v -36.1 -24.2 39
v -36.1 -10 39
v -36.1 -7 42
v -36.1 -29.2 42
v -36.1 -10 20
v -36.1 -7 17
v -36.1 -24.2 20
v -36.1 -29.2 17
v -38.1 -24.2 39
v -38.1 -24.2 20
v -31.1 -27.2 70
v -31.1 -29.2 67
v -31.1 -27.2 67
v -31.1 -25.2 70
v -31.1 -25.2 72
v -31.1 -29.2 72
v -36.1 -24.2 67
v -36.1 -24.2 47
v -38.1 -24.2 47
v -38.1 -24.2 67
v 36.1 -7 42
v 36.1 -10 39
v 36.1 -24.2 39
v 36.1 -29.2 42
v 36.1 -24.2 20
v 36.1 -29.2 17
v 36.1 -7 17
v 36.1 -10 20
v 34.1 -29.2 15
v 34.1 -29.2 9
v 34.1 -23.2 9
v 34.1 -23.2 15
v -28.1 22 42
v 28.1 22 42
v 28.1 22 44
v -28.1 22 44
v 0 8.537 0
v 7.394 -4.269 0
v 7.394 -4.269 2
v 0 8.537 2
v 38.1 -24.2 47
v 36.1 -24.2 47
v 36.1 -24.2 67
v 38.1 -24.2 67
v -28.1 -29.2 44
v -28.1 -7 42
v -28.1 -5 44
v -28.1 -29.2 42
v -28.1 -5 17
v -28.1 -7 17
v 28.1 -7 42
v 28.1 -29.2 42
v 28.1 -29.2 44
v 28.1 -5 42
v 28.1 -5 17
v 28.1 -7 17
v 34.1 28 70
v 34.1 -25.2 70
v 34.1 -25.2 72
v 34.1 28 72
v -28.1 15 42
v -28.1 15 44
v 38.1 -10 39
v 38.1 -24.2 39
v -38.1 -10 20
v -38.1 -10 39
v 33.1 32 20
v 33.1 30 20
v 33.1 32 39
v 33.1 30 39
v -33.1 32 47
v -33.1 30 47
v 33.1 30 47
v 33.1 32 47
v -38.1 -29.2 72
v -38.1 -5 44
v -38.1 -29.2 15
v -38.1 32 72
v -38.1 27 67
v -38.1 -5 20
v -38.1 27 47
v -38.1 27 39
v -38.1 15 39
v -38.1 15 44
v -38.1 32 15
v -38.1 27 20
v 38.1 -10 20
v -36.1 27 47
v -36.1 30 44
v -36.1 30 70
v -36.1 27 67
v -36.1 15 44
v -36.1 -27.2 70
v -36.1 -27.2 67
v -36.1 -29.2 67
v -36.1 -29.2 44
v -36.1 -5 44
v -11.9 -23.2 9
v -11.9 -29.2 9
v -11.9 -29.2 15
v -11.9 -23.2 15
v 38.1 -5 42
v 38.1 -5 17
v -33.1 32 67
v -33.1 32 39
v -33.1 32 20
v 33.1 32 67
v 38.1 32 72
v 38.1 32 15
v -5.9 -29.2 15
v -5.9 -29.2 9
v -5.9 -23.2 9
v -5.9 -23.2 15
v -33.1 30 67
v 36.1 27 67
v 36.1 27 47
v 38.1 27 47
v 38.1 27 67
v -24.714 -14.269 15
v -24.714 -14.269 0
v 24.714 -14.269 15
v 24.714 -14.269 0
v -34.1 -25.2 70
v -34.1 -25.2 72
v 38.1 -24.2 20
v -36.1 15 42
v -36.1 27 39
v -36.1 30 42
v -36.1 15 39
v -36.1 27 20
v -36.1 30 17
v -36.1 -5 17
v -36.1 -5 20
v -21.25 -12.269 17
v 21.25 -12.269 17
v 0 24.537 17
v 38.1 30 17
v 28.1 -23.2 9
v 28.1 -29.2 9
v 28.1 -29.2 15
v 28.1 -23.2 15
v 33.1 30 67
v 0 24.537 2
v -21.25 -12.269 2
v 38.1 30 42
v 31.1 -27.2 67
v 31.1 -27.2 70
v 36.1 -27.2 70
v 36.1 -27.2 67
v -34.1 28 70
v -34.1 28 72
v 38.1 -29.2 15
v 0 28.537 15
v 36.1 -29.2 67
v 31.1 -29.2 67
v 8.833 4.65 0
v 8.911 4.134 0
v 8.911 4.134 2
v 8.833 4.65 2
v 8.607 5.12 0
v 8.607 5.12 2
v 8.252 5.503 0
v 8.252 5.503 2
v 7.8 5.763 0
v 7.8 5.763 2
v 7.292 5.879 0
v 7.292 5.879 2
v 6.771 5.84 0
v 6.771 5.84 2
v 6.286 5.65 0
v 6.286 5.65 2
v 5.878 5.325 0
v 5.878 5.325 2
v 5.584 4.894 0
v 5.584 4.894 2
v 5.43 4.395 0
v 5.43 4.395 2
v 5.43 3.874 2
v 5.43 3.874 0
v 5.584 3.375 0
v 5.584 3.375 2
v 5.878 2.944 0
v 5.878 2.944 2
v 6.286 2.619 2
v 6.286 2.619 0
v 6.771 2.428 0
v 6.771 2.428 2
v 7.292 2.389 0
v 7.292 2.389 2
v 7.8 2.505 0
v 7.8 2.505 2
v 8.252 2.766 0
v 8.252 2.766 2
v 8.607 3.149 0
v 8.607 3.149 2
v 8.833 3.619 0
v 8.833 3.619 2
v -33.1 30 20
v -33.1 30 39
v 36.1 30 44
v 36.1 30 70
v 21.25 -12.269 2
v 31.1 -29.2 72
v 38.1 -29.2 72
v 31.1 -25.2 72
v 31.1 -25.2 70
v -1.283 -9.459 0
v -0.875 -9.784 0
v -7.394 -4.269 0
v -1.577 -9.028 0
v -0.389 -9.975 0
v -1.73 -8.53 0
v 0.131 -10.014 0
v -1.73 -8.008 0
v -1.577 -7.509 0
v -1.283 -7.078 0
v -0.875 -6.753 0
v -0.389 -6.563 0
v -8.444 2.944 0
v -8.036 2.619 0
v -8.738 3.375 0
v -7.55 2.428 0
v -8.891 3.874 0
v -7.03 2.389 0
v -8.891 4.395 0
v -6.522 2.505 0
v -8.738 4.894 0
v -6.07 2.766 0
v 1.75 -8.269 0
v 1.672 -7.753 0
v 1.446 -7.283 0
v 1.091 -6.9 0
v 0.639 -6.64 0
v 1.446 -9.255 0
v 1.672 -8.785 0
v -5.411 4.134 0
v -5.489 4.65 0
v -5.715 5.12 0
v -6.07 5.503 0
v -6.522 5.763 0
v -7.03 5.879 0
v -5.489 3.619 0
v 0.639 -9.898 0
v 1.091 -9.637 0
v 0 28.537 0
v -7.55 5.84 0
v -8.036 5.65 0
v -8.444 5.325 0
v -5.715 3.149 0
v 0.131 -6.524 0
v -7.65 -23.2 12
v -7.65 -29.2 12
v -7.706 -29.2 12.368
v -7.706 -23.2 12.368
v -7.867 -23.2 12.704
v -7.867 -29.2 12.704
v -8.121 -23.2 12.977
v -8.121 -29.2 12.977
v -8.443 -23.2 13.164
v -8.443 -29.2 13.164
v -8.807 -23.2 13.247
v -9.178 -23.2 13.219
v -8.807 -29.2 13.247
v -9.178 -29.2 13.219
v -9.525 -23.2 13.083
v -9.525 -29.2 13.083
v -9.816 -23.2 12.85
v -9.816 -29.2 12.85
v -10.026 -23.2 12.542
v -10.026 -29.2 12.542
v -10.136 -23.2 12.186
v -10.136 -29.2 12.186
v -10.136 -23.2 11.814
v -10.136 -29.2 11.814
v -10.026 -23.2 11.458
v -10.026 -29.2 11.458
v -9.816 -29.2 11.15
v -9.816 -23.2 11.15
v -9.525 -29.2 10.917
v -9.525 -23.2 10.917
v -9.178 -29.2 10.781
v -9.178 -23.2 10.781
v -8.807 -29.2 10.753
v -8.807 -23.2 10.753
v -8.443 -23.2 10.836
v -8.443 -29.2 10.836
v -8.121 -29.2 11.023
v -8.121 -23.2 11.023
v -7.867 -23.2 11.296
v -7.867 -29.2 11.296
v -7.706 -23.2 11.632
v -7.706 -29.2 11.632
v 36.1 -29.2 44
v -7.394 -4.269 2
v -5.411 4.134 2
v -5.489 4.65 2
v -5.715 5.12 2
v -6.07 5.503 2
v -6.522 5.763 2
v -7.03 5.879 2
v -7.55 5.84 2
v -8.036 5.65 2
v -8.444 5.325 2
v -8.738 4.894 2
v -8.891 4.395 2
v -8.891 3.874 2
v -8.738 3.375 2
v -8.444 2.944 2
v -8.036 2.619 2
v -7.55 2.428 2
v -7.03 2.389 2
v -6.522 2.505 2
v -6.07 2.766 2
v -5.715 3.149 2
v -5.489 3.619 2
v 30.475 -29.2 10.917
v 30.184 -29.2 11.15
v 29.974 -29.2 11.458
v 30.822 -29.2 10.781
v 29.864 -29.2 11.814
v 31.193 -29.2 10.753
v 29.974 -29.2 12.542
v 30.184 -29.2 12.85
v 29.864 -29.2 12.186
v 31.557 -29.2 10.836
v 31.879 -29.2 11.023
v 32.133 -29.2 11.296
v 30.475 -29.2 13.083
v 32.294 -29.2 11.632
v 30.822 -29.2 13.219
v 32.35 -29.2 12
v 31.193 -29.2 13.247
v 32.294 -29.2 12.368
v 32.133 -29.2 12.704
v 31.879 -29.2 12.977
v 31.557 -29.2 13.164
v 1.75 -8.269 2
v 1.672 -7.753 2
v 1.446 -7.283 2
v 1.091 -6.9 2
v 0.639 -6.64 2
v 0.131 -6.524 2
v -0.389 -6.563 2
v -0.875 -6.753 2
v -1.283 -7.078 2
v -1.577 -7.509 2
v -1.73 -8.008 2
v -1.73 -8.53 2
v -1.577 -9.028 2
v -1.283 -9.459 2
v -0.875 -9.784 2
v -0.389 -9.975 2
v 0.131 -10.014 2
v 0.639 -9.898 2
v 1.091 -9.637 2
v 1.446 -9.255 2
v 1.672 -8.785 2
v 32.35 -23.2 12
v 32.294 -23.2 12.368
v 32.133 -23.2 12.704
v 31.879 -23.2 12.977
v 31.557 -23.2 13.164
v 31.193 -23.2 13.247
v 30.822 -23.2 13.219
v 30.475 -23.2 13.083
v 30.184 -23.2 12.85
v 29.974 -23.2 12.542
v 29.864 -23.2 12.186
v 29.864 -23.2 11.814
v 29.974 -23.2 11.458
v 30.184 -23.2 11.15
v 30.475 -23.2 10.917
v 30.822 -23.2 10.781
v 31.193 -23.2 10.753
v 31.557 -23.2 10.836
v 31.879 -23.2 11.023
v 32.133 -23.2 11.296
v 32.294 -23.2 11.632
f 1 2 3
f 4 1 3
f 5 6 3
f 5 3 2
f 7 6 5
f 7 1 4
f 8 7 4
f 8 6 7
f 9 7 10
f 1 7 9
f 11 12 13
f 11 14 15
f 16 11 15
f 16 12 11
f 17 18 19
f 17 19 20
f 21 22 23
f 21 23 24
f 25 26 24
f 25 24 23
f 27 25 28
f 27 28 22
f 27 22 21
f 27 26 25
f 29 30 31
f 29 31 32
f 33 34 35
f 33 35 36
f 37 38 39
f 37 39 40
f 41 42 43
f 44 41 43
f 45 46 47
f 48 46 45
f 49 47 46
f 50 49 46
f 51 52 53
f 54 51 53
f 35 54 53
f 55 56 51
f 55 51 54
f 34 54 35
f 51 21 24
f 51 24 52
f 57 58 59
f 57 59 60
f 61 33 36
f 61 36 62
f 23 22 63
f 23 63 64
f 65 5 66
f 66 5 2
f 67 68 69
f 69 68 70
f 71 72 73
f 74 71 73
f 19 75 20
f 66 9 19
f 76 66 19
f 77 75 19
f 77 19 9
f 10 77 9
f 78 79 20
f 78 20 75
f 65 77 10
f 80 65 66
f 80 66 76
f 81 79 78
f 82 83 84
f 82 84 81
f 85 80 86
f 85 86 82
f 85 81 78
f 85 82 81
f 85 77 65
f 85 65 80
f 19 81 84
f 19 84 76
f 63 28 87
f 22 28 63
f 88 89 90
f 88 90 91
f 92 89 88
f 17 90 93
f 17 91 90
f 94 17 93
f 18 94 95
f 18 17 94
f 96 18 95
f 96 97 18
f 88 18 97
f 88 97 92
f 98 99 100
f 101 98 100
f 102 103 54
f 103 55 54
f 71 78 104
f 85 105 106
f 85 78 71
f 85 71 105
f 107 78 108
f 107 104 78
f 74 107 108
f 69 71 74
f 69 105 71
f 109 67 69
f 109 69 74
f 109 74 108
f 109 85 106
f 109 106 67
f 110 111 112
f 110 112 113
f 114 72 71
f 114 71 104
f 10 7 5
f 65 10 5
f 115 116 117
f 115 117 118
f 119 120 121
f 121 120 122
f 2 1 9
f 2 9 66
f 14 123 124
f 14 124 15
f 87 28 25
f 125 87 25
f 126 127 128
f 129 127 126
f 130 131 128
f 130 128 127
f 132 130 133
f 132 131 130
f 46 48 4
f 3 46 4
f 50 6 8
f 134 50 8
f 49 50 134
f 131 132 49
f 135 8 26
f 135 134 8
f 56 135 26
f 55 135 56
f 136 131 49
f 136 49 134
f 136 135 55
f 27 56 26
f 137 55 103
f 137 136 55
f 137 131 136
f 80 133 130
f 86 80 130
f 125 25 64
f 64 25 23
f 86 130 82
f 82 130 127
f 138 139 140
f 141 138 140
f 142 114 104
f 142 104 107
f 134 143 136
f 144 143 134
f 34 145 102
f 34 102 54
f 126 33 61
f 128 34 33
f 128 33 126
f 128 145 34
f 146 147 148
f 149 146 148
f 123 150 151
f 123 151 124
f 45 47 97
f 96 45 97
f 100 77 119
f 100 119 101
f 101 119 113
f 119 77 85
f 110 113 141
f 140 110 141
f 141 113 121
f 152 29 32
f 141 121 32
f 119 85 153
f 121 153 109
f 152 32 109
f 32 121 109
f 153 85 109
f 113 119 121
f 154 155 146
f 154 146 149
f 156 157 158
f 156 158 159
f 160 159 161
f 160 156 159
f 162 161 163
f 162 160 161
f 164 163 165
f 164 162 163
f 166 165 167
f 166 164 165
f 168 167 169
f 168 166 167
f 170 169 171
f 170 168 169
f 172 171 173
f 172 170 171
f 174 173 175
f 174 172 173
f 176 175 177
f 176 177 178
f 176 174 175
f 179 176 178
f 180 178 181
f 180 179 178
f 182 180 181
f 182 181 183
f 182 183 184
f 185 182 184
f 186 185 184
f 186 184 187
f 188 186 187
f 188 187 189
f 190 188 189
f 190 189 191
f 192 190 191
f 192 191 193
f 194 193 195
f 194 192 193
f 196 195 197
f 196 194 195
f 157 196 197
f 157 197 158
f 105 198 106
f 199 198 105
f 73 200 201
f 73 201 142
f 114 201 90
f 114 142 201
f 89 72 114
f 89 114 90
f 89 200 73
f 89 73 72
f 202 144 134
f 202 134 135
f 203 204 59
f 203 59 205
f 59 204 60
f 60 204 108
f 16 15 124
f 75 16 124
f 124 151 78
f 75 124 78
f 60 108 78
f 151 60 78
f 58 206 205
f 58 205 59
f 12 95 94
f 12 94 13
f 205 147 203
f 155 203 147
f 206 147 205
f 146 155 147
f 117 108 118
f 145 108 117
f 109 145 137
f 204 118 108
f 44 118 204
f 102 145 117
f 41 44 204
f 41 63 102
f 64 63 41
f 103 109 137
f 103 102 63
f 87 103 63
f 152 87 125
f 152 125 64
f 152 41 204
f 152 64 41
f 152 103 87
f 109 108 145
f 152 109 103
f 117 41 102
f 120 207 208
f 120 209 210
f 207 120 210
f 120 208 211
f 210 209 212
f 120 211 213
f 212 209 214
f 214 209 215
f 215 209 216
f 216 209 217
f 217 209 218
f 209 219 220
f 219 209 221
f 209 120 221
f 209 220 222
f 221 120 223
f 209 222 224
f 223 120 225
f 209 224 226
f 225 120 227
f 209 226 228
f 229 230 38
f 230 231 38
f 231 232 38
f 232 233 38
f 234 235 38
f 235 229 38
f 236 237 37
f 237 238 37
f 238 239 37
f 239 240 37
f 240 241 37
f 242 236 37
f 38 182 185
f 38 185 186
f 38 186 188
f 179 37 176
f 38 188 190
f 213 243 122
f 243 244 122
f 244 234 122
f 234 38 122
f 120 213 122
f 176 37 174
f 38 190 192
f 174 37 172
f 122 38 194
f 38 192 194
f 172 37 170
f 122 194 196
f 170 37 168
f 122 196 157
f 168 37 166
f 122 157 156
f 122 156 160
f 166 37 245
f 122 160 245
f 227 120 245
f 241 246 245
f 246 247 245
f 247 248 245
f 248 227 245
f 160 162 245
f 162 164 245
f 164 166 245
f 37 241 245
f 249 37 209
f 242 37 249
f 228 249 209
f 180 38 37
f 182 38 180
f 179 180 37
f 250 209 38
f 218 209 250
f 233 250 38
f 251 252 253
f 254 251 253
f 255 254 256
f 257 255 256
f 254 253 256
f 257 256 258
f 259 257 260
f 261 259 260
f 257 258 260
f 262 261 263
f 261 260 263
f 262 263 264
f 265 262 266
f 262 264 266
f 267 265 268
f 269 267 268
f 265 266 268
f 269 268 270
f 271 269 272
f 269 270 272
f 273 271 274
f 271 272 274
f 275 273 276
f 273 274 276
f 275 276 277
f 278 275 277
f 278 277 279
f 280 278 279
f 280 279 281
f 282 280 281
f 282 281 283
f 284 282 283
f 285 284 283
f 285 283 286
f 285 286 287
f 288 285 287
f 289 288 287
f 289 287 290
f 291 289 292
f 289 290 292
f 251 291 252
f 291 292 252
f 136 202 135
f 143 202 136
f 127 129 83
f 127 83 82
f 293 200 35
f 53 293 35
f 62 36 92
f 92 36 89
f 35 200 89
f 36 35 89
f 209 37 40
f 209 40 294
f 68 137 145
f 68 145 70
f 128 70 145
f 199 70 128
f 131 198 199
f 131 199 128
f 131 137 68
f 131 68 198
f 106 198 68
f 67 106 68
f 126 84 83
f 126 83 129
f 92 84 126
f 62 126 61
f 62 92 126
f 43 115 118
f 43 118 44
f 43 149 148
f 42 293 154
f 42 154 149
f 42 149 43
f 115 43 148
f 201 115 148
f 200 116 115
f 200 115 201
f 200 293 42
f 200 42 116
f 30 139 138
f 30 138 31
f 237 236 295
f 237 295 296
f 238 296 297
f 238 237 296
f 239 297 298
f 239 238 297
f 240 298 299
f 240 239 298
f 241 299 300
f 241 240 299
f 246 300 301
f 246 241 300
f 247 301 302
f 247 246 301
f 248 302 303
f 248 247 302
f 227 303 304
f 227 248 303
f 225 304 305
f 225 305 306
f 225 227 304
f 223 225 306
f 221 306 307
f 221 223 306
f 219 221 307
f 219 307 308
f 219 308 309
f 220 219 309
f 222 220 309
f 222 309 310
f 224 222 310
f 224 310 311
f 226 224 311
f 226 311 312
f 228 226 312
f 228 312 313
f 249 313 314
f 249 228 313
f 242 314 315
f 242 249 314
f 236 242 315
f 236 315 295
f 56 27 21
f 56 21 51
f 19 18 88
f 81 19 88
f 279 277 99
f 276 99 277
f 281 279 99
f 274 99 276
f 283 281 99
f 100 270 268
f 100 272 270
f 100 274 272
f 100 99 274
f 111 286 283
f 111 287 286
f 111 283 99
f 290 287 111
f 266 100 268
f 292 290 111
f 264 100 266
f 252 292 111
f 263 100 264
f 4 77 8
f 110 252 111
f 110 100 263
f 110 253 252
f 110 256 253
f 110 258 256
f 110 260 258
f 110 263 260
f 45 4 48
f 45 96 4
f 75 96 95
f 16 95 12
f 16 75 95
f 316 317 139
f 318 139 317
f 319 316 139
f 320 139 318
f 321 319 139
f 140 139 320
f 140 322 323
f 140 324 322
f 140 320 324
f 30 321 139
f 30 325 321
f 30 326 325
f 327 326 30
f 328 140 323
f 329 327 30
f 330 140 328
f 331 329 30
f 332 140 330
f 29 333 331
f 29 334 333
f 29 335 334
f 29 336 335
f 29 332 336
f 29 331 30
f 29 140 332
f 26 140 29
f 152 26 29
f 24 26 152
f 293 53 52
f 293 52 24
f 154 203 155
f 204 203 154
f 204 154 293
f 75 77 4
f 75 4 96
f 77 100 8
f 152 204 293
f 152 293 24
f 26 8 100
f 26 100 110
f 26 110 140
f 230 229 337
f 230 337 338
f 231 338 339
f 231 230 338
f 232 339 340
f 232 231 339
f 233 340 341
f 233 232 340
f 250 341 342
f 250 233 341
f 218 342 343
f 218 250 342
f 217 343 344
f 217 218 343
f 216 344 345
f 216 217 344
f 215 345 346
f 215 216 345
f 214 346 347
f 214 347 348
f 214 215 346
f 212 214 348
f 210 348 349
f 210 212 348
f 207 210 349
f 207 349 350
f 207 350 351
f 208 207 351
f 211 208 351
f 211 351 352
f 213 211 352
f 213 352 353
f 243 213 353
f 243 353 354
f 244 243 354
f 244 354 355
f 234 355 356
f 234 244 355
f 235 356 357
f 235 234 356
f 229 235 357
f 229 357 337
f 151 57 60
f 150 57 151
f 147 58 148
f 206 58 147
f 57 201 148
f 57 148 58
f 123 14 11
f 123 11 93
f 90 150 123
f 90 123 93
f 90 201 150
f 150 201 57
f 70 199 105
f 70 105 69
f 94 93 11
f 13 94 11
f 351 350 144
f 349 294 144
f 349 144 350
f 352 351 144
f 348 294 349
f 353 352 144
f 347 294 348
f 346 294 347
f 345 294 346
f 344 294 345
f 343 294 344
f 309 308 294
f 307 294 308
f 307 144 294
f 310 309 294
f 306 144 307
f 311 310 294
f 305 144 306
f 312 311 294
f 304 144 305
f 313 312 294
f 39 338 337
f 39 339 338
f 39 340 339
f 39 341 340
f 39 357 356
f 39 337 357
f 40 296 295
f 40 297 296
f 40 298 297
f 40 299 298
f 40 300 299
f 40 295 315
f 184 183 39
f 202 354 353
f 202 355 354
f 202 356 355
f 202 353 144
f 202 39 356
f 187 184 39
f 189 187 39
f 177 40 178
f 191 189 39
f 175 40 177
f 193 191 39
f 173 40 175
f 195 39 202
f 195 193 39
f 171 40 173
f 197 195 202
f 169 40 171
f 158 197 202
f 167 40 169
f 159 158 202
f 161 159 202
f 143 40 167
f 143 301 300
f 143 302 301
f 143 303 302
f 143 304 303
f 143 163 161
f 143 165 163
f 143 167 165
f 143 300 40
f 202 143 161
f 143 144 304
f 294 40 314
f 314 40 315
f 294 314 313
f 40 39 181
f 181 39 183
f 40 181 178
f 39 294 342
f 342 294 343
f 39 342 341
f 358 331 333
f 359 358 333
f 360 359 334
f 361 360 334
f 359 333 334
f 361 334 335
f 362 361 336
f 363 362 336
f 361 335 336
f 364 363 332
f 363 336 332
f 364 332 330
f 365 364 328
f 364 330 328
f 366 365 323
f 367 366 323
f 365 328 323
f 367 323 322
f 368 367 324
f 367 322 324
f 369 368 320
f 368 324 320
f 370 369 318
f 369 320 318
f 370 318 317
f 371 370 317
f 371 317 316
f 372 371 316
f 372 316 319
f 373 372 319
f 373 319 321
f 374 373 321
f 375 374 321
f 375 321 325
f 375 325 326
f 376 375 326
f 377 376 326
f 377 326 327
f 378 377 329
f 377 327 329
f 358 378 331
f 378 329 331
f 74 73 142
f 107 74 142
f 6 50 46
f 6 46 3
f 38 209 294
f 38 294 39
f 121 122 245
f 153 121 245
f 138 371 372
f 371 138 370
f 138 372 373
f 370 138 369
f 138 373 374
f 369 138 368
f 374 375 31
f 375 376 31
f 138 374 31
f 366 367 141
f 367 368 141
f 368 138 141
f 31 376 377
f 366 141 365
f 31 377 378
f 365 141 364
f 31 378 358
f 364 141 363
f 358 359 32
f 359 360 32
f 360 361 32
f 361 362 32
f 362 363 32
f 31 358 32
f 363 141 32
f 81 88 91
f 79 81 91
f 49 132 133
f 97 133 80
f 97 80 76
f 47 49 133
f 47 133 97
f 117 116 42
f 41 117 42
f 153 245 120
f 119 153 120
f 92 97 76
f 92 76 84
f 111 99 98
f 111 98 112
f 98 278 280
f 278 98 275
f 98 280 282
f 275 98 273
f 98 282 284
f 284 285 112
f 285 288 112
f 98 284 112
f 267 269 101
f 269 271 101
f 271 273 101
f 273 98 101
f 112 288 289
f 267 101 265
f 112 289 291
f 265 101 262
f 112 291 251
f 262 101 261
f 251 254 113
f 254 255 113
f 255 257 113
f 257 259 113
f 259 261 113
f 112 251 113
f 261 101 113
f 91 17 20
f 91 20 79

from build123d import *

# Parameters (mm, degrees)
SKETCH_R        = 1.75
PAD_DEPTH       = 2
PAD001_DEPTH    = 13
SKETCH002_W     = 76.2
SKETCH002_H     = 61.2
PAD002_DEPTH    = 2
PAD003_DEPTH    = 25
SKETCH004_W     = 14.2
SKETCH004_H     = 19
SKETCH004_W_2   = 29
POCKET_DEPTH    = 2
SKETCH005_W     = 66.2
SKETCH005_H     = 19
POCKET001_DEPTH = 2
SKETCH006_W     = 35
SKETCH006_H     = 25
SKETCH006_W_2   = 14.2
SKETCH006_H_2   = 19
POCKET002_DEPTH = 2
PAD004_DEPTH    = 2
PAD005_DEPTH    = 26
SKETCH009_W     = 51.2
SKETCH009_H     = 20
POCKET003_DEPTH = 2
SKETCH010_W     = 66.2
SKETCH010_H     = 20
POCKET004_DEPTH = 2
SKETCH011_W     = 51.2
SKETCH011_H     = 20
POCKET005_DEPTH = 2
PAD006_DEPTH    = 2
SKETCH013_W     = 5
SKETCH013_H     = 3
PAD007_DEPTH    = 2
SKETCH014_W     = 6
SKETCH014_H     = 6
SKETCH014_R     = 1.25
PAD008_DEPTH    = 6
SKETCH015_W     = 8
SKETCH015_H     = 20
POCKET006_DEPTH = 5
SKETCH016_W     = 20
SKETCH016_H     = 24
POCKET007_DEPTH = 5


with BuildPart() as part:
    # Sketch → Pad (new body)
    with BuildSketch(Plane.XY):
        Polygon((0, 28.537386), (-24.714102, -14.268693), (24.714102, -14.268693), align=None)
        with Locations((7.160898, 4.134347)):
            Circle(SKETCH_R, mode=Mode.SUBTRACT)
        with Locations((0, -8.268693)):
            Circle(SKETCH_R, mode=Mode.SUBTRACT)
        with Locations((-7.160898, 4.134347)):
            Circle(SKETCH_R, mode=Mode.SUBTRACT)
        Polygon((0, 8.537386), (-7.393594, -4.268693), (7.393594, -4.268693), align=None, mode=Mode.SUBTRACT)
    extrude(amount=PAD_DEPTH)

    # Sketch001 (on Face11 of Pad) → Pad001 (join)
    with BuildSketch(Plane.XY.offset(2)):
        Polygon((0, 28.537386), (-24.714102, -14.268693), (24.714102, -14.268693), align=None)
        Polygon((0, 24.537386), (-21.25, -12.268693), (21.25, -12.268693), align=None, mode=Mode.SUBTRACT)
    extrude(amount=PAD001_DEPTH)

    # Sketch002 (on Face14 of Pad001) → Pad002 (join)
    with BuildSketch(Plane.XY.offset(15)):
        with Locations((0, 1.4)):
            Rectangle(SKETCH002_W, SKETCH002_H)
        Polygon((0, 24.537386), (-21.25, -12.268693), (21.25, -12.268693), align=None, mode=Mode.SUBTRACT)
    extrude(amount=PAD002_DEPTH)

    # Sketch003 (on Face23 of Pad002) → Pad003 (join)
    with BuildSketch(Plane.XY.offset(17)):
        Polygon((-38.1, -29.2), (-38.1, 32), (38.1, 32), (38.1, -29.2), (36.1, -29.2), (36.1, -7), (28.1, -7), (28.1, -5), (36.1, -5), (36.1, 30), (-36.1, 30), (-36.1, -5), (-28.1, -5), (-28.1, -7), (-36.1, -7), (-36.1, -29.2), align=None)
    extrude(amount=PAD003_DEPTH)

    # Sketch004 (on Face39 of Pad003) → Pocket (cut)
    with BuildSketch(Plane.YZ.offset(-36.1)):
        with Locations((-17.1, 29.5)):
            Rectangle(SKETCH004_W, SKETCH004_H)
        with Locations((12.5, 29.5)):
            Rectangle(SKETCH004_W_2, SKETCH004_H)
    extrude(amount=-POCKET_DEPTH, mode=Mode.SUBTRACT)

    # Sketch005 (on Face46 of Pocket) → Pocket001 (cut)
    with BuildSketch(Plane.XZ.offset(-30)):
        with Locations((0, 29.5)):
            Rectangle(SKETCH005_W, SKETCH005_H)
    extrude(amount=-POCKET001_DEPTH, mode=Mode.SUBTRACT)

    # Sketch006 (on Face49 of Pocket001) → Pocket002 (cut)
    with BuildSketch(Plane(origin=(36.1, 0, 0), x_dir=(0, -1, 0), z_dir=(-1, 0, 0))):
        with Locations((-12.5, 29.5)):
            Rectangle(SKETCH006_W, SKETCH006_H)
        with Locations((17.1, 29.5)):
            Rectangle(SKETCH006_W_2, SKETCH006_H_2)
    extrude(amount=-POCKET002_DEPTH, mode=Mode.SUBTRACT)

    # Sketch007 (on Face34 of Pocket002) → Pad004 (join)
    with BuildSketch(Plane.XY.offset(42)):
        Polygon((-38.1, -29.2), (-38.1, 32), (38.1, 32), (38.1, -29.2), (28.1, -29.2), (28.1, 22), (-28.1, 22), (-28.1, -29.2), align=None)
    extrude(amount=PAD004_DEPTH)

    # Sketch008 (on Face67 of Pad004) → Pad005 (join)
    with BuildSketch(Plane.XY.offset(44)):
        Polygon((-38.1, -29.2), (-38.1, 32), (38.1, 32), (38.1, -29.2), (36.1, -29.2), (36.1, 30), (-36.1, 30), (-36.1, -29.2), align=None)
    extrude(amount=PAD005_DEPTH)

    # Sketch009 (on Face82 of Pad005) → Pocket003 (cut)
    with BuildSketch(Plane.YZ.offset(-36.1)):
        with Locations((1.4, 57)):
            Rectangle(SKETCH009_W, SKETCH009_H)
    extrude(amount=-POCKET003_DEPTH, mode=Mode.SUBTRACT)

    # Sketch010 (on Face85 of Pocket003) → Pocket004 (cut)
    with BuildSketch(Plane.XZ.offset(-30)):
        with Locations((0, 57)):
            Rectangle(SKETCH010_W, SKETCH010_H)
    extrude(amount=-POCKET004_DEPTH, mode=Mode.SUBTRACT)

    # Sketch011 (on Face88 of Pocket004) → Pocket005 (cut)
    with BuildSketch(Plane(origin=(36.1, 0, 0), x_dir=(0, -1, 0), z_dir=(-1, 0, 0))):
        with Locations((-1.4, 57)):
            Rectangle(SKETCH011_W, SKETCH011_H)
    extrude(amount=-POCKET005_DEPTH, mode=Mode.SUBTRACT)

    # Sketch012 (on Face78 of Pocket005) → Pad006 (join)
    with BuildSketch(Plane.XY.offset(70)):
        Polygon((-38.1, -29.2), (-38.1, 32), (38.1, 32), (38.1, -29.2), (31.1, -29.2), (31.1, -25.2), (34.1, -25.2), (34.1, 28), (-34.1, 28), (-34.1, -25.2), (-31.1, -25.2), (-31.1, -29.2), align=None)
    extrude(amount=PAD006_DEPTH)

    # Sketch013 (on Face98 of Pad006) → Pad007 (join)
    with BuildSketch(Plane.XZ.offset(29.2)):
        with Locations((-33.6, 68.5)):
            Rectangle(SKETCH013_W, SKETCH013_H)
        with Locations((33.6, 68.5)):
            Rectangle(SKETCH013_W, SKETCH013_H)
    extrude(amount=-PAD007_DEPTH)

    # Sketch014 (on Face19 of Pad007) → Pad008 (join)
    with BuildSketch(Plane.XZ.offset(29.2)):
        with Locations((31.1, 12)):
            Rectangle(SKETCH014_W, SKETCH014_H)
        with Locations((31.1, 12)):
            Circle(SKETCH014_R, mode=Mode.SUBTRACT)
        with Locations((-8.9, 12)):
            Rectangle(SKETCH014_W, SKETCH014_H)
        with Locations((-8.9, 12)):
            Circle(SKETCH014_R, mode=Mode.SUBTRACT)
    extrude(amount=-PAD008_DEPTH)

    # Sketch015 (on Face83 of Pad008) → Pocket006 (cut)
    with BuildSketch(Plane.XY.offset(44)):
        with Locations((-32.1, 5)):
            Rectangle(SKETCH015_W, SKETCH015_H)
    extrude(amount=-POCKET006_DEPTH, mode=Mode.SUBTRACT)

    # Sketch016 (on Face61 of Pocket006) → Pocket007 (cut)
    with BuildSketch(Plane.YZ.offset(-36.1)):
        with Locations((5, 32)):
            Rectangle(SKETCH016_W, SKETCH016_H)
    extrude(amount=-POCKET007_DEPTH, mode=Mode.SUBTRACT)


solid = part.part
